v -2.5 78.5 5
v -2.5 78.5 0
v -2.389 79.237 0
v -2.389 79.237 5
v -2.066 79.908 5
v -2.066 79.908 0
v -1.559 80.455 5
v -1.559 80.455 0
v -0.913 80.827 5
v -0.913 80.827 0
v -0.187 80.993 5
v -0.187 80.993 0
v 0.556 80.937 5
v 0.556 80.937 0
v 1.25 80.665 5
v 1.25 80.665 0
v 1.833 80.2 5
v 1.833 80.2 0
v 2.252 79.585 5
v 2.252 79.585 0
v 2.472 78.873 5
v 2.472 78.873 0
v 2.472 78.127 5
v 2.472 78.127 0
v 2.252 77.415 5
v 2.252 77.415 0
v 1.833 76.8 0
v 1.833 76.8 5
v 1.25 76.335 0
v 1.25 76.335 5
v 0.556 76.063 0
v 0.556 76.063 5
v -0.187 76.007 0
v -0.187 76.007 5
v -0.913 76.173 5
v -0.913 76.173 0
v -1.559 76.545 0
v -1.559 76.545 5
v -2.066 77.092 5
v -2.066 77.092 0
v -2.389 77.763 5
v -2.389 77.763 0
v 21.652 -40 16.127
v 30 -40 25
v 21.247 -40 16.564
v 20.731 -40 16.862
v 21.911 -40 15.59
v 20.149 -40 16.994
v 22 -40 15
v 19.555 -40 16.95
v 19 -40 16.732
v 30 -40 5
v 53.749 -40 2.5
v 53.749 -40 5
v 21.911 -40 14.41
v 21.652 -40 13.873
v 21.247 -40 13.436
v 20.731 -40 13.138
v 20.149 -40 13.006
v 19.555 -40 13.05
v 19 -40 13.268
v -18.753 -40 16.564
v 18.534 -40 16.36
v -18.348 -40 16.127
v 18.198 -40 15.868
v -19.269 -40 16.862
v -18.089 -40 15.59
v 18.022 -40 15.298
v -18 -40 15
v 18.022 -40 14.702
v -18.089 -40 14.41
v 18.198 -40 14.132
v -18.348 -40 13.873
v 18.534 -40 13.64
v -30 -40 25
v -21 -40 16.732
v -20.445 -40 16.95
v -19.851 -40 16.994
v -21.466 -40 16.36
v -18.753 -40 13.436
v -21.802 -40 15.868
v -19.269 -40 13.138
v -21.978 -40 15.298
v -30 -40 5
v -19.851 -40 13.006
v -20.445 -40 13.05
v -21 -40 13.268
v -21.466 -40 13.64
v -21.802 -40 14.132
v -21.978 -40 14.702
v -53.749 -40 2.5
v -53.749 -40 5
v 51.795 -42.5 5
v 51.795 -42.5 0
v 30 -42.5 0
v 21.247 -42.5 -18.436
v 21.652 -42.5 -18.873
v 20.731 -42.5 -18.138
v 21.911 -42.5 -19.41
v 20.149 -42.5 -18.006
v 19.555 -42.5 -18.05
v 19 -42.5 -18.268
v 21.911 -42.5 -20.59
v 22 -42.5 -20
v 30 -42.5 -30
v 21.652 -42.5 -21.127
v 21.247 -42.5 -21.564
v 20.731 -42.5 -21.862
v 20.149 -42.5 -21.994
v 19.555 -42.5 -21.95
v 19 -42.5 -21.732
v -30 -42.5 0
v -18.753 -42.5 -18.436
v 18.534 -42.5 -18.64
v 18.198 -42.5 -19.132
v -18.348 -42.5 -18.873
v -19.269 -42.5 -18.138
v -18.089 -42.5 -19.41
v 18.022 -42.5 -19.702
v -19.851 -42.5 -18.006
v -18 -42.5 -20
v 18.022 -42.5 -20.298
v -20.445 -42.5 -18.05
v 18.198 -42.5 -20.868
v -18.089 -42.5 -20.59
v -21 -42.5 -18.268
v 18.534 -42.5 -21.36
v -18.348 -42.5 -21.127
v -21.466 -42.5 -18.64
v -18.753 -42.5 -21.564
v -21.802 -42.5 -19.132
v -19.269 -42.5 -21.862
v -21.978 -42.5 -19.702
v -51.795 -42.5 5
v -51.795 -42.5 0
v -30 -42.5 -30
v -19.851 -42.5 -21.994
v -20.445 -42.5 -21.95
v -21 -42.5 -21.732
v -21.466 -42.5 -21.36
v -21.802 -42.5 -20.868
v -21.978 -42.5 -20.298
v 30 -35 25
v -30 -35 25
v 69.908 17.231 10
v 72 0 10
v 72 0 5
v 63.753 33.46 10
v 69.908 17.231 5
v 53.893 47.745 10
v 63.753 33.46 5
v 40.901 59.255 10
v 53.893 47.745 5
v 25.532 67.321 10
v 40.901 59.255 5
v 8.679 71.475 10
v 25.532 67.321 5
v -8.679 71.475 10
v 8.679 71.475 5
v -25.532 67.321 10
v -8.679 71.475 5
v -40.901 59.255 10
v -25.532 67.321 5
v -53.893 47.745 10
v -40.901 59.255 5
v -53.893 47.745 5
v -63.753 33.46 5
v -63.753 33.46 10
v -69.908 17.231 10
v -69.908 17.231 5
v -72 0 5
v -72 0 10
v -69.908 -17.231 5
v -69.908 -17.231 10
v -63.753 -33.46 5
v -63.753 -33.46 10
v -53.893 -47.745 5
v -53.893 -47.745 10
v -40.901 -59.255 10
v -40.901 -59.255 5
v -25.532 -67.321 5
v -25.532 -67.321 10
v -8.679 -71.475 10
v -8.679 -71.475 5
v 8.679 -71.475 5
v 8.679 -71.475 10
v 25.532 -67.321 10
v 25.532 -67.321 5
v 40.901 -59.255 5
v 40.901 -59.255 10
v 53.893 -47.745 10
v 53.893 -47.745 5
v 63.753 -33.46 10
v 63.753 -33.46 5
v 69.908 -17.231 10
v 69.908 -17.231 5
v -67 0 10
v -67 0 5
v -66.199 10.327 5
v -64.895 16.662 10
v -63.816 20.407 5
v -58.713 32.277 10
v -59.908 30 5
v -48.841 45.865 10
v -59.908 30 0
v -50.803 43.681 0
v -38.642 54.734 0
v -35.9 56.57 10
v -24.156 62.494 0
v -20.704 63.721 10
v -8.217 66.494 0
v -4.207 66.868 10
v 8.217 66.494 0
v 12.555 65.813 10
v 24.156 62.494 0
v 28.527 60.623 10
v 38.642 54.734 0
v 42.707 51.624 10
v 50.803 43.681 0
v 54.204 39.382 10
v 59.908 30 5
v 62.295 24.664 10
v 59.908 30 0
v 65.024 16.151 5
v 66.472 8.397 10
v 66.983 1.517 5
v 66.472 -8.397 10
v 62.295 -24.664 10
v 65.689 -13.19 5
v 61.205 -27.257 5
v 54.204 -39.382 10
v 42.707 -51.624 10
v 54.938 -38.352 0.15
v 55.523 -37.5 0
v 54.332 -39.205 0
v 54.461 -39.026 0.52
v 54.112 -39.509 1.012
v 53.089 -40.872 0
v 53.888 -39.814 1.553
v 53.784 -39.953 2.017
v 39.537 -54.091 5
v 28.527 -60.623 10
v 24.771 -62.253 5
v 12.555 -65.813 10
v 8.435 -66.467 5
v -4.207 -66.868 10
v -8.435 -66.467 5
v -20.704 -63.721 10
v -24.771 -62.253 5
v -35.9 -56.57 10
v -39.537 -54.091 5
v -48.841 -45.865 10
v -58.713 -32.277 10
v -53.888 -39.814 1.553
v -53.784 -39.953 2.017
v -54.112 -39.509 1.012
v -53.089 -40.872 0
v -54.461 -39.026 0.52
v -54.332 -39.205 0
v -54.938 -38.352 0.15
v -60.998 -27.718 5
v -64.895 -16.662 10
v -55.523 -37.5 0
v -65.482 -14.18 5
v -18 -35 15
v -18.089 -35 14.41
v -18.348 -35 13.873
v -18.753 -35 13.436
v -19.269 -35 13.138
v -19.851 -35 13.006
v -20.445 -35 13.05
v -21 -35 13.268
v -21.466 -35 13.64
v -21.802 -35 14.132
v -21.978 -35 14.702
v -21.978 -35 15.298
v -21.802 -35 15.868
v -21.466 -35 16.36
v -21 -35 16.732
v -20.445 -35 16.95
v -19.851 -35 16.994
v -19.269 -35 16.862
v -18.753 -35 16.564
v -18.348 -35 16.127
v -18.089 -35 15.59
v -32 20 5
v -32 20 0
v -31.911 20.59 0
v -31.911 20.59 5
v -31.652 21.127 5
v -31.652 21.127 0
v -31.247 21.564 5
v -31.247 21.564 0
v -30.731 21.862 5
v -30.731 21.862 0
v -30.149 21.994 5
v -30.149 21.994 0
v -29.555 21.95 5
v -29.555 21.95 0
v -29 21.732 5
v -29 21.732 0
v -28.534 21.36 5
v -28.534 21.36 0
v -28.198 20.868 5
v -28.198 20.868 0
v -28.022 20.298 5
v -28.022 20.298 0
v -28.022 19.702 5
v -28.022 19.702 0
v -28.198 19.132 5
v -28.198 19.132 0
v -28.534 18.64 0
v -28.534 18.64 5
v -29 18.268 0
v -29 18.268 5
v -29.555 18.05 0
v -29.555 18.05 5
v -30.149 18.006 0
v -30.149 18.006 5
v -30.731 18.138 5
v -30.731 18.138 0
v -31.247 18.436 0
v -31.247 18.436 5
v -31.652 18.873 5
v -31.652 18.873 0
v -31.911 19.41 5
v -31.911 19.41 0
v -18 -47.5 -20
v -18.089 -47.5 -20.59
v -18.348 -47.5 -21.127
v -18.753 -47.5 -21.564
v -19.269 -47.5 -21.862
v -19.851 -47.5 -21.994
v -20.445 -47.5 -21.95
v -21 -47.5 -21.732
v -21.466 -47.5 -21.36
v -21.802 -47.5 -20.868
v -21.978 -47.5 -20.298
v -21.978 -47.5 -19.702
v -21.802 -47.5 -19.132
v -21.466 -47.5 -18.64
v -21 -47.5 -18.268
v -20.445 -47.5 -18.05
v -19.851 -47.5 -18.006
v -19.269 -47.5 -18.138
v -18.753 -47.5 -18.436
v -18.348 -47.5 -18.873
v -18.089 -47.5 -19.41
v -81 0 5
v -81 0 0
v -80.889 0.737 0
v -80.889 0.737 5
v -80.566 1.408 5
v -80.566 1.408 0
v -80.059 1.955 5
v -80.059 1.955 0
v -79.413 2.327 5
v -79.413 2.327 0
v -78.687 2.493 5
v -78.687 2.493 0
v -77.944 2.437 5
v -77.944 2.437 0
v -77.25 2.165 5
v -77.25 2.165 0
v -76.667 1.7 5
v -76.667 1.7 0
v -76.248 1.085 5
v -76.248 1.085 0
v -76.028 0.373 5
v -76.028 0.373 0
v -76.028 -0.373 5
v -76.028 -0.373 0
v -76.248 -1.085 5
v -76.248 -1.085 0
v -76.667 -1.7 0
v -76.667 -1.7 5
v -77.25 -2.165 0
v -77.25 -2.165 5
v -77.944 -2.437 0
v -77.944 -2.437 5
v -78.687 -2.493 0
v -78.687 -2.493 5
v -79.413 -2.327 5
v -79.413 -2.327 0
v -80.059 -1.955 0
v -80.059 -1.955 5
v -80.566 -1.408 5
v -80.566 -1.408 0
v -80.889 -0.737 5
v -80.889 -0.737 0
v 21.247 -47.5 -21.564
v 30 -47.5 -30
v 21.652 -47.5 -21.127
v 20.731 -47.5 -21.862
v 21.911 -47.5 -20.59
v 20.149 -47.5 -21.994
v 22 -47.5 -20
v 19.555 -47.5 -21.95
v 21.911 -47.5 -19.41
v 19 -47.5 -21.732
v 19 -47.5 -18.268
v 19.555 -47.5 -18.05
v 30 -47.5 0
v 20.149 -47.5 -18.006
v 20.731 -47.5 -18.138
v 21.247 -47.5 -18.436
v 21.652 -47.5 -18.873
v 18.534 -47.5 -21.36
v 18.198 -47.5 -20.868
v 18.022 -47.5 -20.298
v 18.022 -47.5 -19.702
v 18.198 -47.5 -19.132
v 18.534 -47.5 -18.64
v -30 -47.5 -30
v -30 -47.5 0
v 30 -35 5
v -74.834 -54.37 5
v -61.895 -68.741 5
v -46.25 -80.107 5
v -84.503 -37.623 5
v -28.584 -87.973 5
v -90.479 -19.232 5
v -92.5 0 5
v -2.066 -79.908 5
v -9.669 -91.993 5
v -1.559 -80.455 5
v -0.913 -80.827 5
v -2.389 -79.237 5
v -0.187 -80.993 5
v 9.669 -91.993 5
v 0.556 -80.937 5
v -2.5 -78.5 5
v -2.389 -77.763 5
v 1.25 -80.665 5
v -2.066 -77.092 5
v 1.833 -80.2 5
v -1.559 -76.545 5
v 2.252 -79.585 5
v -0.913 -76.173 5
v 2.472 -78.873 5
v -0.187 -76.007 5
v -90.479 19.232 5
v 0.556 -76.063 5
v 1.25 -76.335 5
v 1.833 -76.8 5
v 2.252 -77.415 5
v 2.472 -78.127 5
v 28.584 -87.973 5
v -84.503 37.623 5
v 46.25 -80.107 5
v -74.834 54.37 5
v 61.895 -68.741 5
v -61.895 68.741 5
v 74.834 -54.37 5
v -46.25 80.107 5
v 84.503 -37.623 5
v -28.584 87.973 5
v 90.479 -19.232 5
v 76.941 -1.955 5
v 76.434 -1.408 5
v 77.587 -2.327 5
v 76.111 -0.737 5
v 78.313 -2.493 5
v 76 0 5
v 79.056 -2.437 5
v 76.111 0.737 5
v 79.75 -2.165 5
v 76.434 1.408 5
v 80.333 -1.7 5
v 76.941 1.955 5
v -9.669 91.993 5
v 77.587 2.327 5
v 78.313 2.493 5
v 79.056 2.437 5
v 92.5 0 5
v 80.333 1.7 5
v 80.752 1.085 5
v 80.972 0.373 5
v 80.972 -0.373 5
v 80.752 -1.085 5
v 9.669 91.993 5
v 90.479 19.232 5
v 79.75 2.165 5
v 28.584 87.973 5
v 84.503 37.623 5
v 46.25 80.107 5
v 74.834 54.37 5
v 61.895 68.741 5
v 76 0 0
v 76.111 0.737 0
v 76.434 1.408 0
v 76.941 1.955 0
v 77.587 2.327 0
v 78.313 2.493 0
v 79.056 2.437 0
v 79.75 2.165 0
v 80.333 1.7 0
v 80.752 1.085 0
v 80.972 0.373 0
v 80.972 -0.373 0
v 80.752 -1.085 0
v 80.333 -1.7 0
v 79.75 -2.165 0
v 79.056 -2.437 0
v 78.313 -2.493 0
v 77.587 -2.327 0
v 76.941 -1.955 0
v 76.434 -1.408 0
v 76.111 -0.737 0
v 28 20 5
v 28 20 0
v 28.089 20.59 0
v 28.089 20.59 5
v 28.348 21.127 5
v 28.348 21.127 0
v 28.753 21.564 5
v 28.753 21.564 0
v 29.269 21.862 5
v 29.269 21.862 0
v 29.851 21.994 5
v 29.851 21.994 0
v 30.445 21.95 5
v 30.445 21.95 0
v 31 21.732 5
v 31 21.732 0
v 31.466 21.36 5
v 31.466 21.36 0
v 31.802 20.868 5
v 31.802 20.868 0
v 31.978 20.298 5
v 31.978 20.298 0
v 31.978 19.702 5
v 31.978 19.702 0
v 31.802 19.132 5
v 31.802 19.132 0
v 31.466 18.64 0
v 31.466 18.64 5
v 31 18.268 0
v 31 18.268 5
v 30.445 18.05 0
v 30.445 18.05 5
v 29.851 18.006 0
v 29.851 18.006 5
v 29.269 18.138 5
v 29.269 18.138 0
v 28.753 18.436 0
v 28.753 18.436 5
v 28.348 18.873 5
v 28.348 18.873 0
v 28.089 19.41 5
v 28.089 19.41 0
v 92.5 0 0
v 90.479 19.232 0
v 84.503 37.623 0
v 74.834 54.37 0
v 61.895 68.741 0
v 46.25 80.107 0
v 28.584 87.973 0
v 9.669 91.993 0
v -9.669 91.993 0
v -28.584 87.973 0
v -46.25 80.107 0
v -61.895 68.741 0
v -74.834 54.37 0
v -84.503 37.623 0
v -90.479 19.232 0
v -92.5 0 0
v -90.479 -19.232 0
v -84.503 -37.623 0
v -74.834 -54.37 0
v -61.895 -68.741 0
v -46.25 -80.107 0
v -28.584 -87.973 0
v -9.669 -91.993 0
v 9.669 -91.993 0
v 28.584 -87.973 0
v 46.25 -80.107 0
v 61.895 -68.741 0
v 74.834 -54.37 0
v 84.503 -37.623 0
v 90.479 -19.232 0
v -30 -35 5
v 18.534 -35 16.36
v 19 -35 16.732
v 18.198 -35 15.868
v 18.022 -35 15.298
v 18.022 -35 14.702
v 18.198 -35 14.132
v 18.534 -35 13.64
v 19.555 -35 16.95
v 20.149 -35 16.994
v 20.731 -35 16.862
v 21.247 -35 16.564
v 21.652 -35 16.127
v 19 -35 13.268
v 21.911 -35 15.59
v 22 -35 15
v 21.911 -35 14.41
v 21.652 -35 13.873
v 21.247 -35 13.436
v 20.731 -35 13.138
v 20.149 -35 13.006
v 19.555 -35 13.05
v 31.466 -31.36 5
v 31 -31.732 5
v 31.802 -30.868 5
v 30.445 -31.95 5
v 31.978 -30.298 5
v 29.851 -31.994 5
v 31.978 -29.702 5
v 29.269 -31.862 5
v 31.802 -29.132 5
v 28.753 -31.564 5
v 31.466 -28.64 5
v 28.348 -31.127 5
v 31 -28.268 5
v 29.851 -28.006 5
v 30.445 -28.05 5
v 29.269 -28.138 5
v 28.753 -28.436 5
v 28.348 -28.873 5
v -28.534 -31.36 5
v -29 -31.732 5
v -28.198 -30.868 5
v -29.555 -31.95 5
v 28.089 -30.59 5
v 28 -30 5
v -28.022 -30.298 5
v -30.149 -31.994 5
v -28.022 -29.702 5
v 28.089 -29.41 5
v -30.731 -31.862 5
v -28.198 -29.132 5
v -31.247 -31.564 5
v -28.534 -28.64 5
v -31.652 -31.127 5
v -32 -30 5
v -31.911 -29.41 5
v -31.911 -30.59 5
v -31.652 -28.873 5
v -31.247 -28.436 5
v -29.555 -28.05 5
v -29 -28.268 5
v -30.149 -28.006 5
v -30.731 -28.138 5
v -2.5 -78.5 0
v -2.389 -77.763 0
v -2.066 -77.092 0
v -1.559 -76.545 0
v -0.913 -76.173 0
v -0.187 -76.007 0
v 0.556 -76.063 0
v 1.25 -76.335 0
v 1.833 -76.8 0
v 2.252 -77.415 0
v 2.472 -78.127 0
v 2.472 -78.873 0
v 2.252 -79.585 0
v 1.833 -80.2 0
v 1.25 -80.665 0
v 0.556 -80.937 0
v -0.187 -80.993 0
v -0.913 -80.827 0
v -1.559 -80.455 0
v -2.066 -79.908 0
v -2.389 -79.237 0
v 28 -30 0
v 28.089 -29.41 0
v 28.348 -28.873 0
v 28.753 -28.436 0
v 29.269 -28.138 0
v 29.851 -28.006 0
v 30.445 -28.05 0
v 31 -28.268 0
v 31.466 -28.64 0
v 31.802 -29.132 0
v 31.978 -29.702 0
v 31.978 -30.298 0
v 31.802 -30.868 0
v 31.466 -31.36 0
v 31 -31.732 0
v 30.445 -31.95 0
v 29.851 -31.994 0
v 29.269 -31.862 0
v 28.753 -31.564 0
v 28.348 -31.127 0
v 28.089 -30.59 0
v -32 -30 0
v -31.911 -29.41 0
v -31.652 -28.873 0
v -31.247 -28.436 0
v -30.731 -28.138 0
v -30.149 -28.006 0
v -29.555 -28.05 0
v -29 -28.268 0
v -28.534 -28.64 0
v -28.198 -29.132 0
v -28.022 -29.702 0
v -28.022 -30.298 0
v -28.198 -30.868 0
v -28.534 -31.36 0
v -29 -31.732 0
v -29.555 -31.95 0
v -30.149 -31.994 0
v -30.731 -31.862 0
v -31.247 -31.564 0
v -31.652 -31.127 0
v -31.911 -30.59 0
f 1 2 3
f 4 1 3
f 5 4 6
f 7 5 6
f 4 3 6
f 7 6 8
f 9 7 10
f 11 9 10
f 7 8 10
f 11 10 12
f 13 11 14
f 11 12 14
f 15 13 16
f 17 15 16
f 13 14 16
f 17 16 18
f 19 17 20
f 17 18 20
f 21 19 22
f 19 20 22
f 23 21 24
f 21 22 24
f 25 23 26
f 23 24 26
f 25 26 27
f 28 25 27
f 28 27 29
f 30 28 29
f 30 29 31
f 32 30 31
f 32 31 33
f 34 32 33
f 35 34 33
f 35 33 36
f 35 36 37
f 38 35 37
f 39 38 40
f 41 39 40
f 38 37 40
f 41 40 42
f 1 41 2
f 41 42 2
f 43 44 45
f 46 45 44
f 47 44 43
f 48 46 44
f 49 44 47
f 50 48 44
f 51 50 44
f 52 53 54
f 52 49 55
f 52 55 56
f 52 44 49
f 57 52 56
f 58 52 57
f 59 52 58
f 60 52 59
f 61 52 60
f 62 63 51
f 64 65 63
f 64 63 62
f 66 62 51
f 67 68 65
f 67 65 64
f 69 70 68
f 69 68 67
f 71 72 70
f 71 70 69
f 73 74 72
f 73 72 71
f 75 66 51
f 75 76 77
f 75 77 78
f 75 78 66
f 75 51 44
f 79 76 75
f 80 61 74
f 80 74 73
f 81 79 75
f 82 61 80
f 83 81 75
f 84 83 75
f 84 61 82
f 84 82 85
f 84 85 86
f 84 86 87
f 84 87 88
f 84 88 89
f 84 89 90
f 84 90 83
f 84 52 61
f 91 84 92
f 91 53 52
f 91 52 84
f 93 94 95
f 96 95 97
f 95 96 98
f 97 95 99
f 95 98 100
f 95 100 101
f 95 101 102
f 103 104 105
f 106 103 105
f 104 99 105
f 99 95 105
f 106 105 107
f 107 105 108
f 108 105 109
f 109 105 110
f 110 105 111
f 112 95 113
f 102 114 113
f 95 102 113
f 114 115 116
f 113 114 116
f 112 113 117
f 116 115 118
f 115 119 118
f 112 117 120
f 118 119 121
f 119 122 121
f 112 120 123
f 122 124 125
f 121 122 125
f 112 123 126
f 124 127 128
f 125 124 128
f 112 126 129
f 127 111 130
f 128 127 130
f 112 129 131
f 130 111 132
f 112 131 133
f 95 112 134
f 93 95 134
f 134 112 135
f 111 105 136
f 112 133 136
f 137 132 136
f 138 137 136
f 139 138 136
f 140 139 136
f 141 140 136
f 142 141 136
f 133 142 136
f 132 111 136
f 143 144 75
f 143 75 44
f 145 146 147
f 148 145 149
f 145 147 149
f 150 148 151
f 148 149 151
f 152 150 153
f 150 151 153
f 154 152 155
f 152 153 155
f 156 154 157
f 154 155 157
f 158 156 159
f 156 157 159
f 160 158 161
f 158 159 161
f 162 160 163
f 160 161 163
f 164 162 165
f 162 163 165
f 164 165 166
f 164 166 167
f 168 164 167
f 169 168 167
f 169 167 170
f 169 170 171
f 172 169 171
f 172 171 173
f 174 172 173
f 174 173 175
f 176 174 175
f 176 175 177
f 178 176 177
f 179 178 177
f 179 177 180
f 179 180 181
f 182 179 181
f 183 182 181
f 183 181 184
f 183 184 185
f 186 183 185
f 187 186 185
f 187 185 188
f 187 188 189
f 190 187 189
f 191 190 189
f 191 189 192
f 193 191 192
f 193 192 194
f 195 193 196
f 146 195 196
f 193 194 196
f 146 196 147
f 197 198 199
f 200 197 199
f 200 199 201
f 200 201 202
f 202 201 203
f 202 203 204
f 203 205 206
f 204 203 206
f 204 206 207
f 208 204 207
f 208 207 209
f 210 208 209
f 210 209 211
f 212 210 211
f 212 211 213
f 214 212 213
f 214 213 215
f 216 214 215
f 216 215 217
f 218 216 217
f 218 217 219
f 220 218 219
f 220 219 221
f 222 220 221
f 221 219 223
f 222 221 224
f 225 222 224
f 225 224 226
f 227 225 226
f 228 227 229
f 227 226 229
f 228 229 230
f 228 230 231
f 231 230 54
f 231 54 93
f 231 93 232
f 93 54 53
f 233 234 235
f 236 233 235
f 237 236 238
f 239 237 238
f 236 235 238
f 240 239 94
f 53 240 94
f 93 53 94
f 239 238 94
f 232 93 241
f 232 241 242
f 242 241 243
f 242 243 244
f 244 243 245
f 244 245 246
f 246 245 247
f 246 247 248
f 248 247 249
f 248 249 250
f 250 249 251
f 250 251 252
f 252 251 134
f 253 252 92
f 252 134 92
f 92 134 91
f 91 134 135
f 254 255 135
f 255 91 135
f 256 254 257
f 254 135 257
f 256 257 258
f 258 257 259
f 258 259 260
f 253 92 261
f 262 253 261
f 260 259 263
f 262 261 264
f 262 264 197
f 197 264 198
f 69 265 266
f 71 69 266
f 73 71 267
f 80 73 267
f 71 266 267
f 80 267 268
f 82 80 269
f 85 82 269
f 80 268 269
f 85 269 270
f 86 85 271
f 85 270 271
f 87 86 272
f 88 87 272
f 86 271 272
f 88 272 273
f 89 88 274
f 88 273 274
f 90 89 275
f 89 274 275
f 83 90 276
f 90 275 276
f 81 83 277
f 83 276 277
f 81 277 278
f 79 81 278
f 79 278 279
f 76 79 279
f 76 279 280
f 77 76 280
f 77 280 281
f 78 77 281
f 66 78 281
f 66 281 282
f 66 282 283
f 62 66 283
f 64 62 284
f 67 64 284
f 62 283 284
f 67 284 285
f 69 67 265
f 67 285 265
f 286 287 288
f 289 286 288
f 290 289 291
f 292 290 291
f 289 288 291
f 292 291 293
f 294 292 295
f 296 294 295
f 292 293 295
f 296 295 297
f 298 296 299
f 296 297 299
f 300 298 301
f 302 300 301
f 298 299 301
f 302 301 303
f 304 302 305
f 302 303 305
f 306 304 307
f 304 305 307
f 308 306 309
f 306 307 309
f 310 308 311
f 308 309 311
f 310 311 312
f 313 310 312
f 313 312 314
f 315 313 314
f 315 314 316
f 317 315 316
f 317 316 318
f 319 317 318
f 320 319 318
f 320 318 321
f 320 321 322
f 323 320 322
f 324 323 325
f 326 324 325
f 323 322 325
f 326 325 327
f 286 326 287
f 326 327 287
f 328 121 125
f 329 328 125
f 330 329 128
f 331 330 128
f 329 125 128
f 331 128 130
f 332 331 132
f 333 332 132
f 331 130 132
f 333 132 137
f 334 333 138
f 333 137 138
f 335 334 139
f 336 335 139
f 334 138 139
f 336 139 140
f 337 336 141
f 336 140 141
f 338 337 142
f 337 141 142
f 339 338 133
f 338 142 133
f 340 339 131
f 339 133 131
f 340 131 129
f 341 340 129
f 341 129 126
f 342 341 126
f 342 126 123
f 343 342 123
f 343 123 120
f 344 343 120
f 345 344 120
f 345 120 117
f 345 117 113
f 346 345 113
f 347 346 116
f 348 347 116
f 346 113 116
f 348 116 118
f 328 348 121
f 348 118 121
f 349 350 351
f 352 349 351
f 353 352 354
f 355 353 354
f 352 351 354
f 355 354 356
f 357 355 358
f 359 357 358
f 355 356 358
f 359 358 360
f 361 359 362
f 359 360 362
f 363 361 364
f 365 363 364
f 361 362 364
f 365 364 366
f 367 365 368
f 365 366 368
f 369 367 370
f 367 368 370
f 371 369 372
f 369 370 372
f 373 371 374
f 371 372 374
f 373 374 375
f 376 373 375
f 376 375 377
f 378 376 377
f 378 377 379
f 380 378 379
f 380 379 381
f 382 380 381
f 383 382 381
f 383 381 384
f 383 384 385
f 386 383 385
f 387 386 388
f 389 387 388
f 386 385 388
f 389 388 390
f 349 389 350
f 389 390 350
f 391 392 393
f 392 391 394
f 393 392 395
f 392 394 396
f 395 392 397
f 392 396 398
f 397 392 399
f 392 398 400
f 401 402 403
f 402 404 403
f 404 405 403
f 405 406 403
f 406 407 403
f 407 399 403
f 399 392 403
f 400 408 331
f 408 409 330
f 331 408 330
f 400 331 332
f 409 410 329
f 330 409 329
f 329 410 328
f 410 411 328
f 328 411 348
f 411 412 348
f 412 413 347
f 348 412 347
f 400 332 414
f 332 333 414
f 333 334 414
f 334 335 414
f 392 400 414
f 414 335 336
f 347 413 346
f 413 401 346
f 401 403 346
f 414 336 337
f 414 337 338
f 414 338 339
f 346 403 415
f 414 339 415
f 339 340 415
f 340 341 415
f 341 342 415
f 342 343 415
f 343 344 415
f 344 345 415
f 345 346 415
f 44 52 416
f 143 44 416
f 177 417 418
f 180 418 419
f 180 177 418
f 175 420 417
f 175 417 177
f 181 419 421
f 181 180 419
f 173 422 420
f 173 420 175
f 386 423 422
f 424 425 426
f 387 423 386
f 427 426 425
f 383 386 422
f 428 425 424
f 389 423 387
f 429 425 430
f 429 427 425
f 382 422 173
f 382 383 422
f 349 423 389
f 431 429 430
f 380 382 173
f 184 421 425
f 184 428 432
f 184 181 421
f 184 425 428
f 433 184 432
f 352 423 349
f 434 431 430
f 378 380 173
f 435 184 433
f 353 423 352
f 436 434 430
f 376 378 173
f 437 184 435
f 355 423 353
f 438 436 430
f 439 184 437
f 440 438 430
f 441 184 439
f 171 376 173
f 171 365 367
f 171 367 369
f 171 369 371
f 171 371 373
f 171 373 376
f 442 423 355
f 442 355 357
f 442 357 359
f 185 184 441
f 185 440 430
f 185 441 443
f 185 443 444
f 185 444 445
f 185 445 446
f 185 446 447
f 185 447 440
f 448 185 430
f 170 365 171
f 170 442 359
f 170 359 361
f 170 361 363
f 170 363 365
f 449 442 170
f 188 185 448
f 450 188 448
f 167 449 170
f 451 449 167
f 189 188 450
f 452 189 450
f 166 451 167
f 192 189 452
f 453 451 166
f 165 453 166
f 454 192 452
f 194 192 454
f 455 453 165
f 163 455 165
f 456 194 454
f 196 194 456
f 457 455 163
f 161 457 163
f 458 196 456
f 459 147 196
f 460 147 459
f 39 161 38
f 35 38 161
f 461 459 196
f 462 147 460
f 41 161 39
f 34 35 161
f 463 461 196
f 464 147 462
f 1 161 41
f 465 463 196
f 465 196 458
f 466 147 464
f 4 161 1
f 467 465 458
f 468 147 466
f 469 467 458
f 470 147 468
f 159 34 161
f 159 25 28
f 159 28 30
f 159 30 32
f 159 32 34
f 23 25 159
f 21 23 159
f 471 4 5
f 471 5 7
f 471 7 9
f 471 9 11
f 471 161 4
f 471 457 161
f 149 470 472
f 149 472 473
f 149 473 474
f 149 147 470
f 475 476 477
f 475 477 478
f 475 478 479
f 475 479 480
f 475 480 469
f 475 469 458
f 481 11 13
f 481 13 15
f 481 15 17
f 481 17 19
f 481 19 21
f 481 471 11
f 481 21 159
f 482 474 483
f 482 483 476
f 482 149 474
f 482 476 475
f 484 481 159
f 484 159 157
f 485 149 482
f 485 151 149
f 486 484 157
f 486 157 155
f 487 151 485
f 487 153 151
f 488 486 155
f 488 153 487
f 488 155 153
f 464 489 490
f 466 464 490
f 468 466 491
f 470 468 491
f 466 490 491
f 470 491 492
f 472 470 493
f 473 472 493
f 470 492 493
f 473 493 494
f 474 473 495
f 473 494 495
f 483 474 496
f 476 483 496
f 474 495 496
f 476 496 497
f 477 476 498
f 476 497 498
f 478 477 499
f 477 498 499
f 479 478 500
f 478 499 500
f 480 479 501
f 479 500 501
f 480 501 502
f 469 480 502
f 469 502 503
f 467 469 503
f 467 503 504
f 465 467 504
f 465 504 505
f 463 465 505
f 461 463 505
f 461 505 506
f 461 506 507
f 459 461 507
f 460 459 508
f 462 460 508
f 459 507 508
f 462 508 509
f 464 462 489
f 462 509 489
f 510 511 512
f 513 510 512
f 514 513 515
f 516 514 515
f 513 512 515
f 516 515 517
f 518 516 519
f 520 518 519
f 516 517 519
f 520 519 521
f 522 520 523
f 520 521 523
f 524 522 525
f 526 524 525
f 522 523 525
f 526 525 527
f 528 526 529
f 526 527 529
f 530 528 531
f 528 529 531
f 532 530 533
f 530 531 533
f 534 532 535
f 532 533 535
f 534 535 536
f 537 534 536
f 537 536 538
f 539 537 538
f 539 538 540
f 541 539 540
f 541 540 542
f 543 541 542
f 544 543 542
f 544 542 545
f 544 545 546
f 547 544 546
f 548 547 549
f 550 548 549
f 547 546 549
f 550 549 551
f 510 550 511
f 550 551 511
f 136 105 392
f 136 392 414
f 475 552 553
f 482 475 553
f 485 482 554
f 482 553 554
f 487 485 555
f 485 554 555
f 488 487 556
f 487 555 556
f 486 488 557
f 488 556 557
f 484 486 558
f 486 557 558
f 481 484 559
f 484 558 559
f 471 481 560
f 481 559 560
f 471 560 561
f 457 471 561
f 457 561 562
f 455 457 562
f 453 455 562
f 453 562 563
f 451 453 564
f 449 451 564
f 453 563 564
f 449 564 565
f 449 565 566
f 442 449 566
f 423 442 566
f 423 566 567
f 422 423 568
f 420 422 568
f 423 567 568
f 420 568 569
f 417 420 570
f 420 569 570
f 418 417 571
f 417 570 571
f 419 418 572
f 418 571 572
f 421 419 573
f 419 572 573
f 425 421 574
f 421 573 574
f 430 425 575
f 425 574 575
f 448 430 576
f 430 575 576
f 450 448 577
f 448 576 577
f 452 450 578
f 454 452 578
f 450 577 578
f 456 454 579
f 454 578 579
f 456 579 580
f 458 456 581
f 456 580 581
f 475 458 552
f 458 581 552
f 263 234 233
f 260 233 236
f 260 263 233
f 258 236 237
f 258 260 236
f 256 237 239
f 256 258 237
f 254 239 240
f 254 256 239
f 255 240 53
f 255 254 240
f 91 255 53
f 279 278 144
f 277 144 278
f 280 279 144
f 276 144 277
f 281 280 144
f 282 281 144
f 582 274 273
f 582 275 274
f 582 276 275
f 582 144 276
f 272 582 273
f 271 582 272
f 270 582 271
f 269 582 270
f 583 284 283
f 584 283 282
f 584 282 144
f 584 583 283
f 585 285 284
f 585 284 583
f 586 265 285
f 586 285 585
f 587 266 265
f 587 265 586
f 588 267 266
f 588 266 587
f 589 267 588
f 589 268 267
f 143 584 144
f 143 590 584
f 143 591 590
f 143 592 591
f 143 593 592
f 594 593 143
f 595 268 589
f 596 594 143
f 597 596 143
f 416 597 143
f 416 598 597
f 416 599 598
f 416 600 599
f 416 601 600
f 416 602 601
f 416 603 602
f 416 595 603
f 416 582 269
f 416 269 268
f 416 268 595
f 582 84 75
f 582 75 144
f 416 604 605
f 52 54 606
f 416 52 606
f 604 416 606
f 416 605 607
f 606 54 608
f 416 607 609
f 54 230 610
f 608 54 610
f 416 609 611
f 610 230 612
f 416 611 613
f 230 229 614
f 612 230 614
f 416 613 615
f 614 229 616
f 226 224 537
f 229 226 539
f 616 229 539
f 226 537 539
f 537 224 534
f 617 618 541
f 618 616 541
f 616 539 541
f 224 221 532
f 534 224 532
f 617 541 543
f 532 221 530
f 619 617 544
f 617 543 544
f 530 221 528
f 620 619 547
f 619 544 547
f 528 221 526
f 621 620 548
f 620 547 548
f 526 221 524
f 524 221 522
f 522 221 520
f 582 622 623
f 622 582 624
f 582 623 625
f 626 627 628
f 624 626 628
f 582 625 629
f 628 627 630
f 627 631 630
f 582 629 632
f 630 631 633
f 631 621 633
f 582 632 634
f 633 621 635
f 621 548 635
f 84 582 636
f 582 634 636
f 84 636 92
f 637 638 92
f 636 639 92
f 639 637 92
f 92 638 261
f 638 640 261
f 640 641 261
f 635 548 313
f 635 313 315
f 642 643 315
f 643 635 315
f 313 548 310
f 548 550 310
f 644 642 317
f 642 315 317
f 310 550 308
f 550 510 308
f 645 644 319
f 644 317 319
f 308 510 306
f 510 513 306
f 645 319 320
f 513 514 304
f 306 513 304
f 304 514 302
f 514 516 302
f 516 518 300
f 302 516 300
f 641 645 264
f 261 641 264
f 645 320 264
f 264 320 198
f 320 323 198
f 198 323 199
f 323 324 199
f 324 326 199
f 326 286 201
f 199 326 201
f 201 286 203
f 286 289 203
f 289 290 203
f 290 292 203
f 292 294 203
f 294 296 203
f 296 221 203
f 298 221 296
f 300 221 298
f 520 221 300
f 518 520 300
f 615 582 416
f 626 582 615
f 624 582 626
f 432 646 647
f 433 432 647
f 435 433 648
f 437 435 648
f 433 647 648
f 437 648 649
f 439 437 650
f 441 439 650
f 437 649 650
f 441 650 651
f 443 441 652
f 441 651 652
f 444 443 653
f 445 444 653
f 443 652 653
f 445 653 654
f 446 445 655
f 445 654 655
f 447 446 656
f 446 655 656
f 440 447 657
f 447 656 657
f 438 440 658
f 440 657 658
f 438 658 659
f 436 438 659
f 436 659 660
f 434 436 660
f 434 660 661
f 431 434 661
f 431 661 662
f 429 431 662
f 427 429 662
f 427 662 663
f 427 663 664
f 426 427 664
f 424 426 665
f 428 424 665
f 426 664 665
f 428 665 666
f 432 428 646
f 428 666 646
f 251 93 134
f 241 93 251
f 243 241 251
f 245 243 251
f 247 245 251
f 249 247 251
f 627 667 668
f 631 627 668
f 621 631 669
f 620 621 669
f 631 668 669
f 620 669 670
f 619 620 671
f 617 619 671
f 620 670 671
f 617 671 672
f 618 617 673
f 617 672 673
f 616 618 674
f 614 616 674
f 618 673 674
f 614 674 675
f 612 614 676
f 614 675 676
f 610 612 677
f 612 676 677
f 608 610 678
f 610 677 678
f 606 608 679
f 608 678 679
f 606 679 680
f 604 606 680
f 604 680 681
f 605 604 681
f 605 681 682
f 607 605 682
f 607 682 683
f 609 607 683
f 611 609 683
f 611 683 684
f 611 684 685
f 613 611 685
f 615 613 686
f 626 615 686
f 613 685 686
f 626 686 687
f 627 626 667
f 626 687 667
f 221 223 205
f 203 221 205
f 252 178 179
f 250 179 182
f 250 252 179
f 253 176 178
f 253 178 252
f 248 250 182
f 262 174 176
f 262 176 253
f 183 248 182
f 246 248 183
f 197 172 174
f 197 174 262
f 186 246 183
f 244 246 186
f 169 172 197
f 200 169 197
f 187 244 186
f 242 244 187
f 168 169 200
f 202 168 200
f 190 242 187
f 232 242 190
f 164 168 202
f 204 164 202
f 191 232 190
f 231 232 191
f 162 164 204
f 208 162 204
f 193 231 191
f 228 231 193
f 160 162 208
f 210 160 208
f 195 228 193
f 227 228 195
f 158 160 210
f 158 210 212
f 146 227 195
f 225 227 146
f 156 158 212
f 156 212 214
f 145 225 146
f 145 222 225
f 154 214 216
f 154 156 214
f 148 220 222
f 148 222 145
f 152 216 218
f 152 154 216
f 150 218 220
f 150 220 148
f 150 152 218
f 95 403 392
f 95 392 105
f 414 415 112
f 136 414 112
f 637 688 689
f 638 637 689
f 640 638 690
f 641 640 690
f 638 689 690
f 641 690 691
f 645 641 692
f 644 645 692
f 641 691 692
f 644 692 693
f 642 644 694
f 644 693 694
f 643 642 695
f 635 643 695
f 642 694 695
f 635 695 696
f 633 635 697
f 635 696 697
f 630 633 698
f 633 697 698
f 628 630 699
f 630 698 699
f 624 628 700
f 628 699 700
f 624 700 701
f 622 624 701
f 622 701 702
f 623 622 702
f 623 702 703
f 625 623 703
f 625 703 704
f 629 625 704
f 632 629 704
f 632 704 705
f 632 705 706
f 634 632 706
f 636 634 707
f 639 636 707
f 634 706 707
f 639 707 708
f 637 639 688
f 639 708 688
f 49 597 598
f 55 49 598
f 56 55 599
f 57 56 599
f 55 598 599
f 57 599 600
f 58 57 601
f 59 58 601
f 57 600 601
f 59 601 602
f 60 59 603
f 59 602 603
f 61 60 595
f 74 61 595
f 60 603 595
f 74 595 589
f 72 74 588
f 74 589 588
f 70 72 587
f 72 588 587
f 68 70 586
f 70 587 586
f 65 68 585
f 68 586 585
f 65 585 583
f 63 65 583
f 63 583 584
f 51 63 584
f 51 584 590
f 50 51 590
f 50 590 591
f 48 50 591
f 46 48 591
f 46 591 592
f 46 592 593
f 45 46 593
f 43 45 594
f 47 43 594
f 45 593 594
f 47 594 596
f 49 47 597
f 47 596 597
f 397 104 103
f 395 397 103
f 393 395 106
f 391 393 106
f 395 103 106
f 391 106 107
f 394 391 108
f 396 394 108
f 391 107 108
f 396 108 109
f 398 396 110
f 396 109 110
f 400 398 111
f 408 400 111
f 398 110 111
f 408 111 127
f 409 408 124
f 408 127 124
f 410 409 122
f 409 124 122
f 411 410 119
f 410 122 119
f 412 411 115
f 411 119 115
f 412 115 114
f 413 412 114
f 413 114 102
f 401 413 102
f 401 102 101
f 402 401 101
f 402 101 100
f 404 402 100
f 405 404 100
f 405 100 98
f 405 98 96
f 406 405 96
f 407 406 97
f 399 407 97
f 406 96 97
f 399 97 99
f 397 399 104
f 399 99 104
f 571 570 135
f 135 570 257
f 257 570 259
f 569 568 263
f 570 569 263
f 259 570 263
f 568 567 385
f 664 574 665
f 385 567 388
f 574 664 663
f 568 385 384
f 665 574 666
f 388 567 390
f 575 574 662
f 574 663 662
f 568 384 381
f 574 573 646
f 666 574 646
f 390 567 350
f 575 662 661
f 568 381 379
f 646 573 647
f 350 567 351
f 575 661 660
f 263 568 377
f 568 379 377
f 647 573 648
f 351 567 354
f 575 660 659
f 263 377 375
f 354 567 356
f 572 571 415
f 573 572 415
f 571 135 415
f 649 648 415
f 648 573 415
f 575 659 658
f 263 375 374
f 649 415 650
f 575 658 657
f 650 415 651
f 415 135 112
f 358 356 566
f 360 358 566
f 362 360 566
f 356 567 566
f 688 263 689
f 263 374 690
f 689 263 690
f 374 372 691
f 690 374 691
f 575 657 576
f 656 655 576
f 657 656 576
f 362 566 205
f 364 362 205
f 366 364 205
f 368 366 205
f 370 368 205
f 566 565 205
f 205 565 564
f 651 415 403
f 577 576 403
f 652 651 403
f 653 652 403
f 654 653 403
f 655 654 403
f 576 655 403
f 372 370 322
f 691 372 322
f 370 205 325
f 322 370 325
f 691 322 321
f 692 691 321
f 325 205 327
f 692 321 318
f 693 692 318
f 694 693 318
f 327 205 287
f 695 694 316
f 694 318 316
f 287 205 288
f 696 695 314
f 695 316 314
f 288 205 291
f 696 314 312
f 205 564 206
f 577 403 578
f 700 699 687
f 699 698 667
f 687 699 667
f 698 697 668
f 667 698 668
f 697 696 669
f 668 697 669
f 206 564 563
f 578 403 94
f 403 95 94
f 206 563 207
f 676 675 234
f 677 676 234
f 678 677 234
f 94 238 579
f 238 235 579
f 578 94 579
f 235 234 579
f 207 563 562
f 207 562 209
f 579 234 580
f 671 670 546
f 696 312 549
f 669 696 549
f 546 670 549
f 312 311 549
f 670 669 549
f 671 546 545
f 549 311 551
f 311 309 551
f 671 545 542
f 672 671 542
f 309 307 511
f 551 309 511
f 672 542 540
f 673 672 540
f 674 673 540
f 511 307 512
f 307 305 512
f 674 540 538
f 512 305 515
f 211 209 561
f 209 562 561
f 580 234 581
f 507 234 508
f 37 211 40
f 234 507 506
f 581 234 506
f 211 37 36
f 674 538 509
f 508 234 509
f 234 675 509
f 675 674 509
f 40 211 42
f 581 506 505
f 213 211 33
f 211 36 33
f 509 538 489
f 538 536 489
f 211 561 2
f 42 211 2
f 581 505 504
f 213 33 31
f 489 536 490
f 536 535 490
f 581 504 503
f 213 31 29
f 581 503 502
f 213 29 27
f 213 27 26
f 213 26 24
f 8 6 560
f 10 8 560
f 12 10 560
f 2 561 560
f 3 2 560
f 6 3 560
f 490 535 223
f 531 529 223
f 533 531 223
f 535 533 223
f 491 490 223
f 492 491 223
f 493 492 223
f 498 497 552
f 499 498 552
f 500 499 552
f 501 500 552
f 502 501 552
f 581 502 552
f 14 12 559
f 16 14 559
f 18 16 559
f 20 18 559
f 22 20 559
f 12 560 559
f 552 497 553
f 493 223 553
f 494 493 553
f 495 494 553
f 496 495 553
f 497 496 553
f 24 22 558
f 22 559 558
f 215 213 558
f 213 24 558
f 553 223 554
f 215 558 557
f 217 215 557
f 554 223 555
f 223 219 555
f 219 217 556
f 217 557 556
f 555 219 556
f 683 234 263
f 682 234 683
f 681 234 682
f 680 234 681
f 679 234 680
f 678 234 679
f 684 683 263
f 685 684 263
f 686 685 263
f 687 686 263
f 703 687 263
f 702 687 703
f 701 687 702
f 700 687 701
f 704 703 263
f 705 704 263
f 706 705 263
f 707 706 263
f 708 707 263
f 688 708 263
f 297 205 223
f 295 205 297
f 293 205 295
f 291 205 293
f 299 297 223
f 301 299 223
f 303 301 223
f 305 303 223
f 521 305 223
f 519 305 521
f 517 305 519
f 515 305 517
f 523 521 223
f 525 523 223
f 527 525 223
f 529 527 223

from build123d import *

# Parameters (mm, degrees)
SKETCH1_R           = 92.5
BOSS_EXTRUDE1_DEPTH = 5
SKETCH2_R           = 72
BOSS_EXTRUDE2_DEPTH = 5
SKETCH3_R           = 67
CUT_EXTRUDE1_DEPTH  = 11
SKETCH4_W           = 140
SKETCH4_H           = 70
BOSS_EXTRUDE3_DEPTH = 5
SKETCH6_W           = 60
SKETCH6_H           = 5
BOSS_EXTRUDE4_DEPTH = 20
FILLET1_R           = 2.5
SKETCH7_W           = 110
SKETCH7_H           = 25
BOSS_EXTRUDE5_DEPTH = 5
SKETCH8_W           = 60
SKETCH8_H           = 5
BOSS_EXTRUDE6_DEPTH = 30
SKETCH9_R           = 2
CUT_EXTRUDE2_DEPTH  = 5
SKETCH10_R          = 2
CUT_EXTRUDE3_DEPTH  = 5
SKETCH11_R          = 2
CUT_EXTRUDE4_DEPTH  = 5
SKETCH12_R          = 2.5
CUT_EXTRUDE5_DEPTH  = 5


with BuildPart() as part:
    # Sketch1 → Boss-Extrude1 (new body)
    with BuildSketch(Plane.XY):
        Circle(SKETCH1_R)
    extrude(amount=BOSS_EXTRUDE1_DEPTH)

    # Sketch2 → Boss-Extrude2 (add)
    with BuildSketch(Plane.XY.offset(5)):
        Circle(SKETCH2_R)
    extrude(amount=BOSS_EXTRUDE2_DEPTH)

    # Sketch3 → Cut-Extrude1 (cut, through all)
    with BuildSketch(Plane(origin=(0, 0, 0), x_dir=(-1, 0, 0), z_dir=(0, 0, -1))):
        Circle(SKETCH3_R)
    extrude(amount=-CUT_EXTRUDE1_DEPTH, mode=Mode.SUBTRACT)

    # Sketch4 → Boss-Extrude3 (add)
    with BuildSketch(Plane(origin=(0, 0, 0), x_dir=(-1, 0, 0), z_dir=(0, 0, -1))):
        with Locations((0, -5)):
            Rectangle(SKETCH4_W, SKETCH4_H)
    extrude(amount=-BOSS_EXTRUDE3_DEPTH)

    # Sketch6 → Boss-Extrude4 (add)
    with BuildSketch(Plane.XY.offset(5)):
        with Locations((0, -37.5)):
            Rectangle(SKETCH6_W, SKETCH6_H)
    extrude(amount=BOSS_EXTRUDE4_DEPTH)

    # Fillet1
    fillet1_edges = [part.edges().sort_by_distance(p)[0] for p in [
        (0, -40, 0),
    ]]
    fillet(fillet1_edges, radius=FILLET1_R)

    # Sketch7 → Boss-Extrude5 (add)
    with BuildSketch(Plane(origin=(0, 0, 0), x_dir=(-1, 0, 0), z_dir=(0, 0, -1))):
        with Locations((0, -55)):
            Rectangle(SKETCH7_W, SKETCH7_H)
    extrude(amount=-BOSS_EXTRUDE5_DEPTH)

    # Sketch8 → Boss-Extrude6 (add)
    with BuildSketch(Plane(origin=(0, 0, 0), x_dir=(-1, 0, 0), z_dir=(0, 0, -1))):
        with Locations((0, -45)):
            Rectangle(SKETCH8_W, SKETCH8_H)
    extrude(amount=BOSS_EXTRUDE6_DEPTH)

    # Sketch9 → Cut-Extrude2 (cut)
    with BuildSketch(Plane(origin=(0, -35, 0), x_dir=(1, 0, 0), z_dir=(0, 1, 0))):
        with Locations((-20, -15)):
            Circle(SKETCH9_R)
        with Locations((20, -15)):
            Circle(SKETCH9_R)
    extrude(amount=-CUT_EXTRUDE2_DEPTH, mode=Mode.SUBTRACT)

    # Sketch10 → Cut-Extrude3 (cut)
    with BuildSketch(Plane(origin=(0, -42.5, 0), x_dir=(1, 0, 0), z_dir=(0, 1, 0))):
        with Locations((-20, 20)):
            Circle(SKETCH10_R)
        with Locations((20, 20)):
            Circle(SKETCH10_R)
    extrude(amount=-CUT_EXTRUDE3_DEPTH, mode=Mode.SUBTRACT)

    # Sketch11 → Cut-Extrude4 (cut)
    with BuildSketch(Plane(origin=(0, 0, 0), x_dir=(-1, 0, 0), z_dir=(0, 0, -1))):
        with Locations((-30, -30)):
            Circle(SKETCH11_R)
        with Locations((-30, 20)):
            Circle(SKETCH11_R)
        with Locations((30, 20)):
            Circle(SKETCH11_R)
        with Locations((30, -30)):
            Circle(SKETCH11_R)
    extrude(amount=-CUT_EXTRUDE4_DEPTH, mode=Mode.SUBTRACT)

    # Sketch12 → Cut-Extrude5 (cut)
    with BuildSketch(Plane(origin=(0, 0, 0), x_dir=(-1, 0, 0), z_dir=(0, 0, -1))):
        with Locations((0, -78.5)):
            Circle(SKETCH12_R)
        with Locations((-78.5, 0)):
            Circle(SKETCH12_R)
        with Locations((0, 78.5)):
            Circle(SKETCH12_R)
        with Locations((78.5, 0)):
            Circle(SKETCH12_R)
    extrude(amount=-CUT_EXTRUDE5_DEPTH, mode=Mode.SUBTRACT)


solid = part.part
